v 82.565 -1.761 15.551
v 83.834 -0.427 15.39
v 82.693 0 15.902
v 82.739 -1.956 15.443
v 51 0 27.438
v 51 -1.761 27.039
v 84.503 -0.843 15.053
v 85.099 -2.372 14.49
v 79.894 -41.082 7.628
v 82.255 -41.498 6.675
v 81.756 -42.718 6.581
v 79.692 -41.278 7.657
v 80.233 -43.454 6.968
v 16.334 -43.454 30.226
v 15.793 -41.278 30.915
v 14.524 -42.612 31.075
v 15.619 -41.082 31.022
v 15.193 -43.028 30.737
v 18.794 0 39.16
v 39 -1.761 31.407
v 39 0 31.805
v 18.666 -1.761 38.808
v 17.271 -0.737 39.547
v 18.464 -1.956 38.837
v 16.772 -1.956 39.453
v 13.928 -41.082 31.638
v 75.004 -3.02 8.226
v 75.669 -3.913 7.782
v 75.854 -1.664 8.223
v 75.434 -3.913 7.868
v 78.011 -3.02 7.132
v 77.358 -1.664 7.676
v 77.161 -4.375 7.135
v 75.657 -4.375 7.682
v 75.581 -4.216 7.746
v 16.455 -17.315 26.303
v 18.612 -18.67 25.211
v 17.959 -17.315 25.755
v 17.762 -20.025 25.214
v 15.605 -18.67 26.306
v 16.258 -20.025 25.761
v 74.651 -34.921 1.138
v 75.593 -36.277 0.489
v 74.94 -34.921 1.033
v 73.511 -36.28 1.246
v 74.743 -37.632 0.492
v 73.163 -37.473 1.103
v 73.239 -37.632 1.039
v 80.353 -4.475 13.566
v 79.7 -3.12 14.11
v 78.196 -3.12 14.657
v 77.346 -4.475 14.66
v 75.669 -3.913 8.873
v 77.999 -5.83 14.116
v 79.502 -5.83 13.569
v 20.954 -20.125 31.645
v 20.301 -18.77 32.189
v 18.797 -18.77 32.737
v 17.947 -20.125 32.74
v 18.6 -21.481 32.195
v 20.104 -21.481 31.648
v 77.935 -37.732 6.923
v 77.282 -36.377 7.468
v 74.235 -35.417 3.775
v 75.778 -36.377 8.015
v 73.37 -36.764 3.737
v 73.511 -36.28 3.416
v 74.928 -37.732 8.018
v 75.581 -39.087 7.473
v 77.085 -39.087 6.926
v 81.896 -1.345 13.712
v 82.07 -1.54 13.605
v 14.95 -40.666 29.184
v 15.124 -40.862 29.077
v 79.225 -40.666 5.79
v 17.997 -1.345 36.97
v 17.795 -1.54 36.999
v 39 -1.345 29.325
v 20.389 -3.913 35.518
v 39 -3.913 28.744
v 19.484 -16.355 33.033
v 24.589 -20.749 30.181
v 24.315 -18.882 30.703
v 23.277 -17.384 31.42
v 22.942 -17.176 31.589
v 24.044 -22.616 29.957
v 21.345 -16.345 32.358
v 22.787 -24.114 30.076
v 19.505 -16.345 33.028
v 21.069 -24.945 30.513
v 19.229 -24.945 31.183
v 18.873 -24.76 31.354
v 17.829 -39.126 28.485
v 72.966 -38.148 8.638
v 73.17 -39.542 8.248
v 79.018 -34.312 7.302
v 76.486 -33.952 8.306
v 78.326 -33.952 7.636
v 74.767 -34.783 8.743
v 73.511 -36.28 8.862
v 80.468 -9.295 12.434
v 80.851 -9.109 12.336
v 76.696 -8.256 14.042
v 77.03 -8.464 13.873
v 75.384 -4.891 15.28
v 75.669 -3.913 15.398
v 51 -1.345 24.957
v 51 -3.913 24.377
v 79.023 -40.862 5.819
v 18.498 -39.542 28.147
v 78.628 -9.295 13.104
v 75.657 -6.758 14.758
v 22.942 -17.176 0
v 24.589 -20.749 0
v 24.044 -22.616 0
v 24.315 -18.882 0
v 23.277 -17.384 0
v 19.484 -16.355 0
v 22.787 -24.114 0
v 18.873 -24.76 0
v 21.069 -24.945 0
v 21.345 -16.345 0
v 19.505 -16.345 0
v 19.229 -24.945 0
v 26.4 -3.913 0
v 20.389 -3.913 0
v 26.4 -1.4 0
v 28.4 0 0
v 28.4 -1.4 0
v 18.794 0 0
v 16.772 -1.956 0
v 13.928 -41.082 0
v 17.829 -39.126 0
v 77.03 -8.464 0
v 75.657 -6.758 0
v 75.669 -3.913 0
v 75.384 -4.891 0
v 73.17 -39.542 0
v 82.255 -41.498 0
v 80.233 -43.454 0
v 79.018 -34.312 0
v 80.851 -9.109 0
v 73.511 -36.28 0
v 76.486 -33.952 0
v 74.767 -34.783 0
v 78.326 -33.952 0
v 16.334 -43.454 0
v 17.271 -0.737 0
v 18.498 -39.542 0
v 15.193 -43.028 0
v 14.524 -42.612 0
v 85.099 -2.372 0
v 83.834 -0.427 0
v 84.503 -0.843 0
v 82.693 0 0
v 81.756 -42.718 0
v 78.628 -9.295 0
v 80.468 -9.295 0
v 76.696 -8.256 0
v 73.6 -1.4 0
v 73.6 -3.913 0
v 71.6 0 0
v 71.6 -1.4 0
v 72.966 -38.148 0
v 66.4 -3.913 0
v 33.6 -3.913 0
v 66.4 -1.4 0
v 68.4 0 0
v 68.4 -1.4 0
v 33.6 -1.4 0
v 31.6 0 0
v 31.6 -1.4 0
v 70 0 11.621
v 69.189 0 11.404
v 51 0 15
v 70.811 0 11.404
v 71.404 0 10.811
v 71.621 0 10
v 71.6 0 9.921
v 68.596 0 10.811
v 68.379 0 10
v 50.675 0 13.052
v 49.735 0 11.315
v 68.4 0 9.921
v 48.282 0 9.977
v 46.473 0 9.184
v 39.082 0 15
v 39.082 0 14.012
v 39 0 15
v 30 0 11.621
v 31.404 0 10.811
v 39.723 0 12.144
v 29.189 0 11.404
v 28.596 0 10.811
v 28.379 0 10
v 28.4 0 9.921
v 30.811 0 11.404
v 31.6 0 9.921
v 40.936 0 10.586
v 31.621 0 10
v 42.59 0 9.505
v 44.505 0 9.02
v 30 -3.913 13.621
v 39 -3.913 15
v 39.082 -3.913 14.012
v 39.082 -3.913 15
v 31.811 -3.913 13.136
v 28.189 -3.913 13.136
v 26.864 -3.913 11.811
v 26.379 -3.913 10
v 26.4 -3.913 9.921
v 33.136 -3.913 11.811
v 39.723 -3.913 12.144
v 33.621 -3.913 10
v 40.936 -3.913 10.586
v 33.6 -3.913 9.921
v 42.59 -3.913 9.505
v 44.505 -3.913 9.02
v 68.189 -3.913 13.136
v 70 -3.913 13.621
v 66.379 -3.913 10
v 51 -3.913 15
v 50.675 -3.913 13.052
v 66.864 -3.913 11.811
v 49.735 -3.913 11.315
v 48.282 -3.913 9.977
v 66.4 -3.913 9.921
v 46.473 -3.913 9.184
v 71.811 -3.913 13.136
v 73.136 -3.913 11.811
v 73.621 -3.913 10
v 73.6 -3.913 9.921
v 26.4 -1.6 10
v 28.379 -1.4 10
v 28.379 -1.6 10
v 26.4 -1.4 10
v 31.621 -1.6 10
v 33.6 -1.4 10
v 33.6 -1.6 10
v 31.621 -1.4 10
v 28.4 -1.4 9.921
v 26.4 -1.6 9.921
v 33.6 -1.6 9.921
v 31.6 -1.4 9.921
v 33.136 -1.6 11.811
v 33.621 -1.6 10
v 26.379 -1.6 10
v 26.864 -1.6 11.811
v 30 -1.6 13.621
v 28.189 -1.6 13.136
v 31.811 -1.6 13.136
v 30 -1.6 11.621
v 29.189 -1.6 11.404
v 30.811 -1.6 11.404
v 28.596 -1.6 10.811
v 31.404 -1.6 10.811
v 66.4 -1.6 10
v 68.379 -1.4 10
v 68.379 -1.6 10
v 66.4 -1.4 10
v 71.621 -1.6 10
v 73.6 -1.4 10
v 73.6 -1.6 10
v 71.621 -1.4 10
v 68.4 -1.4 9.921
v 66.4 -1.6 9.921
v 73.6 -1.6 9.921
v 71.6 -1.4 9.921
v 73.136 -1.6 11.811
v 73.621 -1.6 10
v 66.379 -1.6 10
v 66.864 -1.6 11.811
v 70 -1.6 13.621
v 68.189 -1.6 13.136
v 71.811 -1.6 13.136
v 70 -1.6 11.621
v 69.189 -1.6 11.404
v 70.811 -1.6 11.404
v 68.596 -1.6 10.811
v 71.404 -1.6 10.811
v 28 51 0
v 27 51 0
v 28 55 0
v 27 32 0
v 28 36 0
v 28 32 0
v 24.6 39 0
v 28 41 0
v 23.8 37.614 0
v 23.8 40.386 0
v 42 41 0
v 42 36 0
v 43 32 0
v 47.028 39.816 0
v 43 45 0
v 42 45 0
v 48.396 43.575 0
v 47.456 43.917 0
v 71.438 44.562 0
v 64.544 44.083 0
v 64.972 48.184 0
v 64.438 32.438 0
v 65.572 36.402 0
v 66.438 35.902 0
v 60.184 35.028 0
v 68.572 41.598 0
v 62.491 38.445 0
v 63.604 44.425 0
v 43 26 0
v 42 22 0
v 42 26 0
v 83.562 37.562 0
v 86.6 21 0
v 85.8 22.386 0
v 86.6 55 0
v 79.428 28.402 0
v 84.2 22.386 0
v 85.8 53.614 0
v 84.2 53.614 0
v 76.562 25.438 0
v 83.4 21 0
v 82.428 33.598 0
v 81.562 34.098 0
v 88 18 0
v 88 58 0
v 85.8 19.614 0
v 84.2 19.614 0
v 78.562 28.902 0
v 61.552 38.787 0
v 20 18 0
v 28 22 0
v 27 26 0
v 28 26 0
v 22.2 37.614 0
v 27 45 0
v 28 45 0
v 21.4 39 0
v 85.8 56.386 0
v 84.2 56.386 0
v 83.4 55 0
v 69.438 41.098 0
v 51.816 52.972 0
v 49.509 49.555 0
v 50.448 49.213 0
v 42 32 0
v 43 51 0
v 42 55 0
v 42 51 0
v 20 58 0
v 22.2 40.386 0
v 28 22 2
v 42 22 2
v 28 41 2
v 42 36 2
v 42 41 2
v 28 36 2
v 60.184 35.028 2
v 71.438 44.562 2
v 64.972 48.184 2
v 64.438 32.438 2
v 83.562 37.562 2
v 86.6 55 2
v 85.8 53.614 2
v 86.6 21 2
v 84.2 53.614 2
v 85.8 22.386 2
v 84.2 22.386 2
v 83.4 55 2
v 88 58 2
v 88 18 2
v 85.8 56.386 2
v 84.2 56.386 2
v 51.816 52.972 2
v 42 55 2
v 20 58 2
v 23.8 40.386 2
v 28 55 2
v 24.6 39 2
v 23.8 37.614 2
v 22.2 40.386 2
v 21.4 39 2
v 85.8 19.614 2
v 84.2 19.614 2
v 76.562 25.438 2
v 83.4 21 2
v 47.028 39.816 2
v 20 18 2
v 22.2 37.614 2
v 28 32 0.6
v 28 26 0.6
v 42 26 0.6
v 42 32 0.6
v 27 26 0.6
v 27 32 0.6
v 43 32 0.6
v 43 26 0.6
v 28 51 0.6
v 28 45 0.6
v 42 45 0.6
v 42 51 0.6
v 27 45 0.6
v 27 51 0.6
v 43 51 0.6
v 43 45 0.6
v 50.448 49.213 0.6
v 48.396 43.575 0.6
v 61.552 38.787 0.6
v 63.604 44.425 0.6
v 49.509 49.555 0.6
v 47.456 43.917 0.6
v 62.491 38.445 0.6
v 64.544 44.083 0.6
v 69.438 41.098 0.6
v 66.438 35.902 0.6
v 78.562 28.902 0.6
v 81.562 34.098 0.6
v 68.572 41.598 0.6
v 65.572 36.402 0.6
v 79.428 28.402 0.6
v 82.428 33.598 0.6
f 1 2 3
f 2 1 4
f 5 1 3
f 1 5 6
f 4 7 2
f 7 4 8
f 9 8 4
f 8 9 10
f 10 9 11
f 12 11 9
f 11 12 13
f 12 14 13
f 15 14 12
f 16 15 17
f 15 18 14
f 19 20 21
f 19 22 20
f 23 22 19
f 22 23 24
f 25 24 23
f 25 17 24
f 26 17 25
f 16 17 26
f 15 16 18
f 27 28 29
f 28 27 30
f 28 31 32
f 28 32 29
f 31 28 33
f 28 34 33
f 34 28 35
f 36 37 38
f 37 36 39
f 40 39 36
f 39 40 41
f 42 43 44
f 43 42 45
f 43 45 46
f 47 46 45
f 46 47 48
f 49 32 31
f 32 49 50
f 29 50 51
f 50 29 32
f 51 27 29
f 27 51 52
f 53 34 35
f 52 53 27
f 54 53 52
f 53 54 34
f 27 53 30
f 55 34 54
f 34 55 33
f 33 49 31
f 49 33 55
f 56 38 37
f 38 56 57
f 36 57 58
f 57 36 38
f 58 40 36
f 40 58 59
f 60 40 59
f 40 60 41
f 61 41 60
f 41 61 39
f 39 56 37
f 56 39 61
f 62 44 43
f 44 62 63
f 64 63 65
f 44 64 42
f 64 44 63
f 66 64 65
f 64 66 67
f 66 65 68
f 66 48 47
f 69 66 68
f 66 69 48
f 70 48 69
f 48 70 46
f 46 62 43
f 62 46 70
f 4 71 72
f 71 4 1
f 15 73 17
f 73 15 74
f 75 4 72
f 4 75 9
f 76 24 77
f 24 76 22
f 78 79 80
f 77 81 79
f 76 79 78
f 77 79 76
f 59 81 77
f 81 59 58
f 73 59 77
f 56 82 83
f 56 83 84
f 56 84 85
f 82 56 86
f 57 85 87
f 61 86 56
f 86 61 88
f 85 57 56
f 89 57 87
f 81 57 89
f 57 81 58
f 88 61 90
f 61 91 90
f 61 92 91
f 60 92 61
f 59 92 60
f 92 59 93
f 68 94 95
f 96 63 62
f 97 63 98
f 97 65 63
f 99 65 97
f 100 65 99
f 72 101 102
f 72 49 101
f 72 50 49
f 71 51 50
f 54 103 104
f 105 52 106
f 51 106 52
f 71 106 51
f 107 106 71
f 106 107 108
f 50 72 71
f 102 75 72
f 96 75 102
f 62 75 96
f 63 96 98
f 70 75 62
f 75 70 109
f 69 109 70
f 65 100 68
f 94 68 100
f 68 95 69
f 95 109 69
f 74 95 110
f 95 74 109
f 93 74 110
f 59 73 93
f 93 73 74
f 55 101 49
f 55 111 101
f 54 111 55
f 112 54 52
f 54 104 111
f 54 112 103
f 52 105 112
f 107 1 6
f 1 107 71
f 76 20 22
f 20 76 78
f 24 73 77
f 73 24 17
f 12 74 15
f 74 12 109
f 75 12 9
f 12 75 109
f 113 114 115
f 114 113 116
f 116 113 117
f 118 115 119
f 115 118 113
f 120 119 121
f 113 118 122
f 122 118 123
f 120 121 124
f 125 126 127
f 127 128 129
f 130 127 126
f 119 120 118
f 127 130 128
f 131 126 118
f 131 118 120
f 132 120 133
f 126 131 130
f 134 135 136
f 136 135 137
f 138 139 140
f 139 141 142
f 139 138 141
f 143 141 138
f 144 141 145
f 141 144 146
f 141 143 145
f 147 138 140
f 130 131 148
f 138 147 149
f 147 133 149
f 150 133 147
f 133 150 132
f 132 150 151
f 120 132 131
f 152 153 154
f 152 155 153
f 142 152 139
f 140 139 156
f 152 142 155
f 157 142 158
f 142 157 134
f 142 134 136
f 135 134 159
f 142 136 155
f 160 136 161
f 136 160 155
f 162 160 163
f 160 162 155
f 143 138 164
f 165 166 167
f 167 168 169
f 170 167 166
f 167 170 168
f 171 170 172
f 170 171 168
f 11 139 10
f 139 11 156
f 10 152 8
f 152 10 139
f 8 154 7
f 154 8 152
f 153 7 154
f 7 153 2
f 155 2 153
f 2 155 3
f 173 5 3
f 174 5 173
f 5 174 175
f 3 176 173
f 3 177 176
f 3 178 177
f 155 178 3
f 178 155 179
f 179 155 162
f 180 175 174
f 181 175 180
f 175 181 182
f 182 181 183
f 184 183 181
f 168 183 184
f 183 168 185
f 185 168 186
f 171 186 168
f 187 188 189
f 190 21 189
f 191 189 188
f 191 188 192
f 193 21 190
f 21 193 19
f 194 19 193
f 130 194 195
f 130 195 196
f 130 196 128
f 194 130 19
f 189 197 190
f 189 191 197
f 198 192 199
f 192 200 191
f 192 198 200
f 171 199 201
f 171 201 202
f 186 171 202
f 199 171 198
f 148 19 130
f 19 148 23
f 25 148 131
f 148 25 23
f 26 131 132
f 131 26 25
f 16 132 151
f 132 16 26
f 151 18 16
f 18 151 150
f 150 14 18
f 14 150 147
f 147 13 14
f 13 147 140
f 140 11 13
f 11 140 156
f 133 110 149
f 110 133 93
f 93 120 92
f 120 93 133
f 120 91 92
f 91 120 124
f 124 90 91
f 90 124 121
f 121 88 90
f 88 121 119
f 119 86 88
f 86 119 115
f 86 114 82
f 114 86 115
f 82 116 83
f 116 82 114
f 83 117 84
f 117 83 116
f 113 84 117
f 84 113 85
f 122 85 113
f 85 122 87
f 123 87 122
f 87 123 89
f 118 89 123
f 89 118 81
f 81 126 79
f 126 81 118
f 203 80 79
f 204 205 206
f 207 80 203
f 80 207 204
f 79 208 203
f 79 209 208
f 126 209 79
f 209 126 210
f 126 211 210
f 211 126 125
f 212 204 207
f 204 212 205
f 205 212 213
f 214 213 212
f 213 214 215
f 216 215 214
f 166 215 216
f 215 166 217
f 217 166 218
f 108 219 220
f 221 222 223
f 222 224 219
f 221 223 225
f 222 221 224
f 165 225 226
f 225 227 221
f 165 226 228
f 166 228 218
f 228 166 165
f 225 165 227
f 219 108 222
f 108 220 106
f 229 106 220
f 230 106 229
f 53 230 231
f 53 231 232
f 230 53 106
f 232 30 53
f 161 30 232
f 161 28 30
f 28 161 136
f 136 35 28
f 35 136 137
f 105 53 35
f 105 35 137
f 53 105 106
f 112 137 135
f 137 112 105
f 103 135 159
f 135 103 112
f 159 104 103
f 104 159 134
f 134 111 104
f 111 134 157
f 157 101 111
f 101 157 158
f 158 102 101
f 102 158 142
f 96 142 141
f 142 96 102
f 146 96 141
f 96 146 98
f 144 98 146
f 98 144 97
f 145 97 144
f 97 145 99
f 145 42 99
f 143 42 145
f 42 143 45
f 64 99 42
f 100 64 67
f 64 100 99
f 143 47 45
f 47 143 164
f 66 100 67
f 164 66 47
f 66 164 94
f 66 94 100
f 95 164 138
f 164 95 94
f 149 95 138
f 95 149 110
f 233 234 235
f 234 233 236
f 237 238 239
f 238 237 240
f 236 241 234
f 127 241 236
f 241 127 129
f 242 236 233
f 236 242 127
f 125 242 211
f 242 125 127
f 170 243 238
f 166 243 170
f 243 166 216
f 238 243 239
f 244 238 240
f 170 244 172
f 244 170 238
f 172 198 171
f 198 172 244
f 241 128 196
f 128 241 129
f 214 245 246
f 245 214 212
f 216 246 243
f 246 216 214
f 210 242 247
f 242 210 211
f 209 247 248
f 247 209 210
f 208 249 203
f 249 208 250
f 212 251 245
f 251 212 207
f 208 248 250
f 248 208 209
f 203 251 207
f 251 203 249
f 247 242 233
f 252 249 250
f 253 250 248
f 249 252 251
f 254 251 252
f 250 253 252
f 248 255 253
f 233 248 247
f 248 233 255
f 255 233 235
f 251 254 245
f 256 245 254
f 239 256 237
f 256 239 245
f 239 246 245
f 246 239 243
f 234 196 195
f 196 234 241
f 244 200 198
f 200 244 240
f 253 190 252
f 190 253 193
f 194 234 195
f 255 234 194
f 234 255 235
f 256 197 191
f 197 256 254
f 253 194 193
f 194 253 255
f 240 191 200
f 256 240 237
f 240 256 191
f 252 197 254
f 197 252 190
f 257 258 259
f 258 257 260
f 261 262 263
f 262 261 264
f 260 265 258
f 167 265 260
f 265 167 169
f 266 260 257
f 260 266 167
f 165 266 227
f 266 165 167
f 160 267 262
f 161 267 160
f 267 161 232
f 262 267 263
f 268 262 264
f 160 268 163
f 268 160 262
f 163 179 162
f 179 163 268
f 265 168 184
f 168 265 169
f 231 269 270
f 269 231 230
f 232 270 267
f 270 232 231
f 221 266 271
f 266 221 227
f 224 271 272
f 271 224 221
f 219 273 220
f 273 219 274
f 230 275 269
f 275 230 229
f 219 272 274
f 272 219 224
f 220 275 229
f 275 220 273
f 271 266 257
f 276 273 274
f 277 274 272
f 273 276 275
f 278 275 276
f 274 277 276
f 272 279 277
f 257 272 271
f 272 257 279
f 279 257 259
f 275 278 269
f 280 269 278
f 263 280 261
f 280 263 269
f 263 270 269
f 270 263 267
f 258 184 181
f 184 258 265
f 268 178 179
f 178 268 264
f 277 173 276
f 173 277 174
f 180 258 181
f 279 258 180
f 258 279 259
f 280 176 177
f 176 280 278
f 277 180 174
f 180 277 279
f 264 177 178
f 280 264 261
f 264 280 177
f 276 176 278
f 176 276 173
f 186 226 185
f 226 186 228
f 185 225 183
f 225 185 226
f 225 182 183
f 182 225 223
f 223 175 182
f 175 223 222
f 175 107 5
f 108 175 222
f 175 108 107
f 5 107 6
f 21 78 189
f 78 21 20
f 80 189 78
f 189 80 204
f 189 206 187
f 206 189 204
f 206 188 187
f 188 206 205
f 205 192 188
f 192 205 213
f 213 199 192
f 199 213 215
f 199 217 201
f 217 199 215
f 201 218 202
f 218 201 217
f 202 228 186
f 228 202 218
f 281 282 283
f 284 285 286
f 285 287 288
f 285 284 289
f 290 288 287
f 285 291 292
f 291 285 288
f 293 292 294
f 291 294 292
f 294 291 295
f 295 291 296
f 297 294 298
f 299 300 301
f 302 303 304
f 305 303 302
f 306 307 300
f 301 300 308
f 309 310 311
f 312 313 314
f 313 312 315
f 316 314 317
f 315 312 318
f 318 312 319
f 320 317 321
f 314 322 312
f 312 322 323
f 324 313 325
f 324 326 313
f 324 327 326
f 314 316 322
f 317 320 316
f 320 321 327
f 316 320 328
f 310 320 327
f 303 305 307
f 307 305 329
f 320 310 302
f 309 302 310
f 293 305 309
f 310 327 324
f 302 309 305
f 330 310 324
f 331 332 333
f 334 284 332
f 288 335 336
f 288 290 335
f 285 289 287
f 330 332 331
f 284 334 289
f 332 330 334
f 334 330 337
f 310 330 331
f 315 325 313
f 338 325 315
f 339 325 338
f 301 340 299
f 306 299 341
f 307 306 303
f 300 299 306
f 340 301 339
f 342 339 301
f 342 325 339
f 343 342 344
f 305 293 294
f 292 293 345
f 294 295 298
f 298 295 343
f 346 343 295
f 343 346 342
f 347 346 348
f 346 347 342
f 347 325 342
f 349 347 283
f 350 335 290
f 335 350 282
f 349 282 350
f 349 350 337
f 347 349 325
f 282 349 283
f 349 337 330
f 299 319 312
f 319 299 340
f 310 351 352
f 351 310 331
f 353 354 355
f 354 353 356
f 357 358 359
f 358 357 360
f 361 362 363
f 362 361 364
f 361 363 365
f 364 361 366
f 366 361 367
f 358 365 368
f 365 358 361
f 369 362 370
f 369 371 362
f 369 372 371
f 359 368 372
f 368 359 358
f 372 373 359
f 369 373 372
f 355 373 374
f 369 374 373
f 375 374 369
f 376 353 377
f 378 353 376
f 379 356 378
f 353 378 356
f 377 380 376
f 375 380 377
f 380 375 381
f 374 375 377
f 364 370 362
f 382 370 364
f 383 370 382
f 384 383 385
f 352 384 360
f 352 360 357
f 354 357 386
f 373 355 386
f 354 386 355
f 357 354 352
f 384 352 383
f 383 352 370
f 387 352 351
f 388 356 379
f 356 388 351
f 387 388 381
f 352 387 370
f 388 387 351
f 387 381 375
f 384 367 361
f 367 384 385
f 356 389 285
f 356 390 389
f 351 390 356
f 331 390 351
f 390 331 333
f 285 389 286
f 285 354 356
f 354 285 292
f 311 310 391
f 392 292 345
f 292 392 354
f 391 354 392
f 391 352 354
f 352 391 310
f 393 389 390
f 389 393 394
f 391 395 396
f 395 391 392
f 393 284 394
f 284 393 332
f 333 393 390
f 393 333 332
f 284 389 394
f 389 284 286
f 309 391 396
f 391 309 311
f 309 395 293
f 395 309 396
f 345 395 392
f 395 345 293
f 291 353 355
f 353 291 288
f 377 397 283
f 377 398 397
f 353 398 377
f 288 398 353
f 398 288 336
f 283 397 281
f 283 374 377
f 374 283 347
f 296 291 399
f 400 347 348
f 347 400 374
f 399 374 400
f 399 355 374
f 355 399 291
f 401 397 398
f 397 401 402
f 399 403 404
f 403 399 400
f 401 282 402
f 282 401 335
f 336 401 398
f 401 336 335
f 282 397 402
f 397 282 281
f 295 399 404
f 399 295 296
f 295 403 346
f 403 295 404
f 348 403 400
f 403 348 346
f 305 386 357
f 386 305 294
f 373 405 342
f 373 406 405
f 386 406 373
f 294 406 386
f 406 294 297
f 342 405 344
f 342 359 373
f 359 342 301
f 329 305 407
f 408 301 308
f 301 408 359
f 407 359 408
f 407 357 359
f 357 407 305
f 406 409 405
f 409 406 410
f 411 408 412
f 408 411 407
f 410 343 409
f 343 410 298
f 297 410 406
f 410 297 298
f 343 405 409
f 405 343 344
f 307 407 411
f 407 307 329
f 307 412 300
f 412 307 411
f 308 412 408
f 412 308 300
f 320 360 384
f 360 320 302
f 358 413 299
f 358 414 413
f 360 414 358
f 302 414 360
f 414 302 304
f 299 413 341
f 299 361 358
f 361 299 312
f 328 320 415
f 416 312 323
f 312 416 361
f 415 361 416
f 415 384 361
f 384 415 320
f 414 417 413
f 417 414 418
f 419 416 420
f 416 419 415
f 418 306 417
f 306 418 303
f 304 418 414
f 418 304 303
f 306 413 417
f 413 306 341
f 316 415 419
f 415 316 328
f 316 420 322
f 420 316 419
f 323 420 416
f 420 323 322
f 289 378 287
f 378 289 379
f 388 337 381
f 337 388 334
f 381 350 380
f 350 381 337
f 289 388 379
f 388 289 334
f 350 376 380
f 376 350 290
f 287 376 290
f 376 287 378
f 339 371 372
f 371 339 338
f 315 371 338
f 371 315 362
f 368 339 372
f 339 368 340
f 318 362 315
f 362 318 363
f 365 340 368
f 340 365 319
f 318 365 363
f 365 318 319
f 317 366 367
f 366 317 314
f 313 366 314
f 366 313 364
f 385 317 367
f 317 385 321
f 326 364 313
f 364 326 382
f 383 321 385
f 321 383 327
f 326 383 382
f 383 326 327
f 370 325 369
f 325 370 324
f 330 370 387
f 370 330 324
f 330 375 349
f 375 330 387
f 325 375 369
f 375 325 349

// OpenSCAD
// file: common.scad
module keyswitch_hole(x=0, y=0, a=0) {
    translate([x, y, 0]) {
        rotate([0, 0, 90+a]) {
            linear_extrude(height = 2) {
            square([14, 14], center = true);
            //translate([-8, 3, 0]) square([1, 3]);
            //translate([-8, -6, 0]) square([1, 3]);
            //translate([7, 3, 0]) square([1, 3]);
            //translate([7, -6, 0]) square([1, 3]);
            }
            linear_extrude(height = 0.6) {
                translate([-3, 7]) square([6, 1]);
            translate([-3, -8]) square([6, 1]);
            }
        }
    }
}

keyswitch_hole();

module joint_male_face() {
    translate([-1, 0])
    square([2,4]);
    translate([-3, 2])
    square([6,2]);
}

module joint_male(pos=[0,0]) {
    translate(pos){
      rotate([0,0,180]){
        linear_extrude(height=10)
        joint_male_face();
        
        translate([0,2,10])
        rotate([-90,0,0])
        linear_extrude(height=2)
        circle(3, $fn=12);
        
        translate([0,0,10])
        rotate([-90,0,0])
        linear_extrude(height=2)
        circle(1, $fn=12);
      }
    }
}

module joint_female(pos=[0,0]) {
    delta = 0.6;
    translate(pos){
      rotate([0,0,180]){
        linear_extrude(height=10)
        offset(delta=delta)
        joint_male_face();
        
        translate([0,1.6,10])
        rotate([-90,0,0])
        linear_extrude(height=2.8)
        offset(delta=delta)
        circle(3, $fn=12);

        translate([0,-0.4,10])
        rotate([-90,0,0])
        linear_extrude(height=2.8)
        offset(delta=delta)
        circle(1, $fn=12);
      }
    }
}


joint_male([20, 0]);
joint_female([30, 0]);
// main file
use <common.scad>;

thumb_plate_points = [
                [20,-42],
                [20, -2],
                [88, -2],
                [88,-42],
                ];

thumb_plate_sc_points = [
                [20+3, -21],
                [88-3, -2-3],
                [88-3, -42+3],
                ];

module plate_nohole() {
    linear_extrude(height=2)
    polygon(points=thumb_plate_points);
}

module keyswitch_col(x=0,y=0,c=3,a=0) {
    translate([x,y])
    rotate([0,0,a])
    for (i = [0:c-1]) {
        keyswitch_hole(0, 19*i);
    }
}

module plate_holes() {
    keyswitch_col(35, -31, 2);
    keyswitch_hole(56, -16, -20);
    keyswitch_hole(74, -25, -30);
    for(p=thumb_plate_sc_points){
        linear_extrude(height=5)
            translate(p)
            circle(1.6);
    }
}


module thumb_plate() {
    difference() {
        plate_nohole();
        plate_holes();
    }
}


tilt_angle = [12,20,0];
tilt_angle_r = tilt_angle * -1;
height = 46;

module thumb_case_outer_face() {
    projection()
        translate([0,0,height])
        rotate(tilt_angle)
        linear_extrude(height=2)
        offset(2)
        polygon(points=thumb_plate_points);
}

module thumb_case_inner_face() {
    projection()
        translate([0,0,height])
        rotate(tilt_angle)
        linear_extrude(height=2)
        offset(-2)
        polygon(points=thumb_plate_points);
}

module thumb_case_bottom_face() {
    difference(){
        thumb_case_outer_face();
        thumb_case_inner_face();
    }
    projection()
    translate([0,0,height])
    rotate(tilt_angle)
    for(p=thumb_plate_sc_points){
        linear_extrude(height=1)
        translate(p)
        circle(4.4);
    }
}

module case() {
    difference() {
        linear_extrude(height=50)
            thumb_case_bottom_face();
        translate([0,0,height])
            rotate(tilt_angle){
            linear_extrude(height=50)
                square(200, center=true);
            // screw hole
            translate([0,0,-9])
                linear_extrude(height=9)
                for(p=thumb_plate_sc_points){
                    translate(p)
                        circle(1.6);
                }
            // plate hole
            translate([0,0,-2])
            linear_extrude(height=2)
            offset(0.2)
            polygon(points=thumb_plate_points);
        }
    }
}

module thumb_case_hole() {
    // cable hole
    translate([45,0,0])
    rotate([90,0,0])
    linear_extrude(height=4){
        translate([0, 15])
        circle(6);
        translate([-6,15])
        square([12, 30]);
    }
    for (x = [30,70]) {
        joint_female([x, 0]);
    }
}

module thumb_case() {
    difference() {
        case();
        thumb_case_hole();
    }
}

thumb_case();

translate([0, 60])
thumb_plate();
